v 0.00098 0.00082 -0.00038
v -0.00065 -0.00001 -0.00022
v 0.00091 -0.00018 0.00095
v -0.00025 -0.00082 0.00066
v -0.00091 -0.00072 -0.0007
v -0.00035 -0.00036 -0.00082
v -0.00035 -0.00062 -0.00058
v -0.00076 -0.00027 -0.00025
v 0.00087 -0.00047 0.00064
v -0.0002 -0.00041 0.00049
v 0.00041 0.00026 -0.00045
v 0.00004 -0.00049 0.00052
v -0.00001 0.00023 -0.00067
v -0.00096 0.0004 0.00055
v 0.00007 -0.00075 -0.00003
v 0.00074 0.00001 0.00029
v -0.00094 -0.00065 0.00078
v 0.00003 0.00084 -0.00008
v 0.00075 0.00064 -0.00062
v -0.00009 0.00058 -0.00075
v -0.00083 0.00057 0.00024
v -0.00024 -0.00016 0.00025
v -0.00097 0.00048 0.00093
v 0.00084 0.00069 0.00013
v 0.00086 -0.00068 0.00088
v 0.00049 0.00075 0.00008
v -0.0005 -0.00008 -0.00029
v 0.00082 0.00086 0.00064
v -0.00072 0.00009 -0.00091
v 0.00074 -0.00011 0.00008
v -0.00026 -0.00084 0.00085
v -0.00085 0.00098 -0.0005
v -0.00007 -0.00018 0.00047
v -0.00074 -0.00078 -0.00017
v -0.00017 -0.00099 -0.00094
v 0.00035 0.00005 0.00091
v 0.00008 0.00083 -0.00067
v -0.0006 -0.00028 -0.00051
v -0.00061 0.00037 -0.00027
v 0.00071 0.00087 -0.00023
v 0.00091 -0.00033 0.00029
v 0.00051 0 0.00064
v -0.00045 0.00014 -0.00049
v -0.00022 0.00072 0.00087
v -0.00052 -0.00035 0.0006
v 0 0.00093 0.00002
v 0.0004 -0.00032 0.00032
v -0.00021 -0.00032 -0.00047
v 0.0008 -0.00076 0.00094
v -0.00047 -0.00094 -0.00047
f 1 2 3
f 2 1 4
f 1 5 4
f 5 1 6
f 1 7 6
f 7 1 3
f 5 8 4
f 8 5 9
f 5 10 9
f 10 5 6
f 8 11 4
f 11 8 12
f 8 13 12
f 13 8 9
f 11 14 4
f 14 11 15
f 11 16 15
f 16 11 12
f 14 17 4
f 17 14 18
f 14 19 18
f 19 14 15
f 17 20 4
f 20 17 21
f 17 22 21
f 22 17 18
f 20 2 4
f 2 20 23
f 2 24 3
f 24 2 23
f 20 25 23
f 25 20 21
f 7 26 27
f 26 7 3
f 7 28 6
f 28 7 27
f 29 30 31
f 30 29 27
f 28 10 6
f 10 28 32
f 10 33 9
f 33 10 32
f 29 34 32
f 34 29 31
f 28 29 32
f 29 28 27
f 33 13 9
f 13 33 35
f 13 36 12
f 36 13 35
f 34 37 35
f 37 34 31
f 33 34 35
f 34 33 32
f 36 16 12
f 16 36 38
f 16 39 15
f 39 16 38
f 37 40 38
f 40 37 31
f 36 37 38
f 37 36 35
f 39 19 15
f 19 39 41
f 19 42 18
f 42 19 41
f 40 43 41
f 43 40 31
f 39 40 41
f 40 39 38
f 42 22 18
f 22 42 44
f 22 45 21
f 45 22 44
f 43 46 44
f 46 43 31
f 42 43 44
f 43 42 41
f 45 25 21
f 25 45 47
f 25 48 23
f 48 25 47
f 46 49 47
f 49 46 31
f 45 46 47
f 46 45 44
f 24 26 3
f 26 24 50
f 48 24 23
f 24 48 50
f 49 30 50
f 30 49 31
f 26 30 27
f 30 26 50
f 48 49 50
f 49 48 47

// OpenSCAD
v=[[-0.253,-0.819,0.661],[0.91,-0.179,0.953],[-0.353,-0.358,-0.822],[0.866,-0.467,0.638],[0.035,-0.486,0.524],[0.066,-0.748,-0.028],[0.03,0.835,-0.08],[-0.83,0.568,0.237],[-0.974,0.483,0.931],[-0.262,-0.838,0.846],[-0.504,-0.079,-0.292],[-0.849,0.978,-0.501],[-0.168,-0.985,-0.939],[-0.601,-0.281,-0.512],[0.911,-0.333,0.291],[-0.221,0.717,0.871],[0.399,-0.321,0.324],[-0.471,-0.937,-0.467],[0.978,0.825,-0.385],[-0.908,-0.721,-0.702],[-0.762,-0.27,-0.245],[0.415,0.261,-0.445],[-0.961,0.402,0.545],[-0.941,-0.646,0.777],[-0.086,0.58,-0.753],[-0.65,-0.012,-0.217],[-0.346,-0.62,-0.578],[0.816,0.864,0.641],[-0.201,-0.415,0.488],[-0.069,-0.182,0.473],[-0.012,0.227,-0.668],[0.353,0.051,0.908],[0.74,0.006,0.287],[-0.612,0.365,-0.272],[0.751,0.641,-0.619],[0.508,0,0.637],[-0.242,-0.161,0.25],[-0.519,-0.352,0.602],[0.857,-0.684,0.875],[-0.205,-0.318,-0.467],[0.837,0.689,0.133],[0.492,0.749,0.075],[-0.719,0.086,-0.905],[-0.74,-0.779,-0.172],[0.075,0.829,-0.668],[0.715,0.874,-0.227],[-0.451,0.137,-0.491],[-0.003,0.927,0.019],[0.803,-0.763,0.942],[0.735,-0.107,0.079],[0.95,-0.518,0.191]];

p=[[1,25,18],[0,18,25],[0,19,18],[2,18,19],[2,26,18],[1,18,26],[0,20,19],[3,19,20],[3,28,19],[2,19,28],[0,21,20],[4,20,21],[4,30,20],[3,20,30],[0,22,21],[5,21,22],[5,32,21],[4,21,32],[0,23,22],[6,22,23],[6,34,22],[5,22,34],[0,24,23],[7,23,24],[7,36,23],[6,23,36],[0,25,24],[8,24,25],[1,40,25],[8,25,40],[8,38,24],[7,24,38],[10,41,26],[1,26,41],[2,27,26],[10,26,27],[9,49,42],[10,42,49],[2,28,27],[11,27,28],[3,29,28],[11,28,29],[11,43,42],[9,42,43],[11,42,27],[10,27,42],[3,30,29],[12,29,30],[4,31,30],[12,30,31],[12,44,43],[9,43,44],[12,43,29],[11,29,43],[4,32,31],[13,31,32],[5,33,32],[13,32,33],[13,45,44],[9,44,45],[13,44,31],[12,31,44],[5,34,33],[14,33,34],[6,35,34],[14,34,35],[14,46,45],[9,45,46],[14,45,33],[13,33,45],[6,36,35],[15,35,36],[7,37,36],[15,36,37],[15,47,46],[9,46,47],[15,46,35],[14,35,46],[7,38,37],[16,37,38],[8,39,38],[16,38,39],[16,48,47],[9,47,48],[16,47,37],[15,37,47],[1,41,40],[17,40,41],[8,40,39],[17,39,40],[17,49,48],[9,48,49],[10,49,41],[17,41,49],[17,48,39],[16,39,48]];
*sphere(10);
scale(0.001)polyhedron(v,p); 

echo(roundlist(v,0.01)/10);
function roundlist(v,r = 1) = len(v) == undef ? v - (v % r) : len(v) == 0 ? [] : [
  for (i = [0: len(v) - 1]) roundlist(v[i],r)
];
function redround(a,b)=a - (a % b);
function rnd(a = 1,b = 0) = (rands(min(a,b),max(a,b),1)[0]);

function rndc(seed) =seed==undef? [rands(0,1,1)[0],rands(0,1,1)[0],rands(0,1,1)[0]]:[rands(0,1,1,seed)[0],rands(0,1,1,seed+101)[0],rands(0,1,1,seed+201)[0]];
